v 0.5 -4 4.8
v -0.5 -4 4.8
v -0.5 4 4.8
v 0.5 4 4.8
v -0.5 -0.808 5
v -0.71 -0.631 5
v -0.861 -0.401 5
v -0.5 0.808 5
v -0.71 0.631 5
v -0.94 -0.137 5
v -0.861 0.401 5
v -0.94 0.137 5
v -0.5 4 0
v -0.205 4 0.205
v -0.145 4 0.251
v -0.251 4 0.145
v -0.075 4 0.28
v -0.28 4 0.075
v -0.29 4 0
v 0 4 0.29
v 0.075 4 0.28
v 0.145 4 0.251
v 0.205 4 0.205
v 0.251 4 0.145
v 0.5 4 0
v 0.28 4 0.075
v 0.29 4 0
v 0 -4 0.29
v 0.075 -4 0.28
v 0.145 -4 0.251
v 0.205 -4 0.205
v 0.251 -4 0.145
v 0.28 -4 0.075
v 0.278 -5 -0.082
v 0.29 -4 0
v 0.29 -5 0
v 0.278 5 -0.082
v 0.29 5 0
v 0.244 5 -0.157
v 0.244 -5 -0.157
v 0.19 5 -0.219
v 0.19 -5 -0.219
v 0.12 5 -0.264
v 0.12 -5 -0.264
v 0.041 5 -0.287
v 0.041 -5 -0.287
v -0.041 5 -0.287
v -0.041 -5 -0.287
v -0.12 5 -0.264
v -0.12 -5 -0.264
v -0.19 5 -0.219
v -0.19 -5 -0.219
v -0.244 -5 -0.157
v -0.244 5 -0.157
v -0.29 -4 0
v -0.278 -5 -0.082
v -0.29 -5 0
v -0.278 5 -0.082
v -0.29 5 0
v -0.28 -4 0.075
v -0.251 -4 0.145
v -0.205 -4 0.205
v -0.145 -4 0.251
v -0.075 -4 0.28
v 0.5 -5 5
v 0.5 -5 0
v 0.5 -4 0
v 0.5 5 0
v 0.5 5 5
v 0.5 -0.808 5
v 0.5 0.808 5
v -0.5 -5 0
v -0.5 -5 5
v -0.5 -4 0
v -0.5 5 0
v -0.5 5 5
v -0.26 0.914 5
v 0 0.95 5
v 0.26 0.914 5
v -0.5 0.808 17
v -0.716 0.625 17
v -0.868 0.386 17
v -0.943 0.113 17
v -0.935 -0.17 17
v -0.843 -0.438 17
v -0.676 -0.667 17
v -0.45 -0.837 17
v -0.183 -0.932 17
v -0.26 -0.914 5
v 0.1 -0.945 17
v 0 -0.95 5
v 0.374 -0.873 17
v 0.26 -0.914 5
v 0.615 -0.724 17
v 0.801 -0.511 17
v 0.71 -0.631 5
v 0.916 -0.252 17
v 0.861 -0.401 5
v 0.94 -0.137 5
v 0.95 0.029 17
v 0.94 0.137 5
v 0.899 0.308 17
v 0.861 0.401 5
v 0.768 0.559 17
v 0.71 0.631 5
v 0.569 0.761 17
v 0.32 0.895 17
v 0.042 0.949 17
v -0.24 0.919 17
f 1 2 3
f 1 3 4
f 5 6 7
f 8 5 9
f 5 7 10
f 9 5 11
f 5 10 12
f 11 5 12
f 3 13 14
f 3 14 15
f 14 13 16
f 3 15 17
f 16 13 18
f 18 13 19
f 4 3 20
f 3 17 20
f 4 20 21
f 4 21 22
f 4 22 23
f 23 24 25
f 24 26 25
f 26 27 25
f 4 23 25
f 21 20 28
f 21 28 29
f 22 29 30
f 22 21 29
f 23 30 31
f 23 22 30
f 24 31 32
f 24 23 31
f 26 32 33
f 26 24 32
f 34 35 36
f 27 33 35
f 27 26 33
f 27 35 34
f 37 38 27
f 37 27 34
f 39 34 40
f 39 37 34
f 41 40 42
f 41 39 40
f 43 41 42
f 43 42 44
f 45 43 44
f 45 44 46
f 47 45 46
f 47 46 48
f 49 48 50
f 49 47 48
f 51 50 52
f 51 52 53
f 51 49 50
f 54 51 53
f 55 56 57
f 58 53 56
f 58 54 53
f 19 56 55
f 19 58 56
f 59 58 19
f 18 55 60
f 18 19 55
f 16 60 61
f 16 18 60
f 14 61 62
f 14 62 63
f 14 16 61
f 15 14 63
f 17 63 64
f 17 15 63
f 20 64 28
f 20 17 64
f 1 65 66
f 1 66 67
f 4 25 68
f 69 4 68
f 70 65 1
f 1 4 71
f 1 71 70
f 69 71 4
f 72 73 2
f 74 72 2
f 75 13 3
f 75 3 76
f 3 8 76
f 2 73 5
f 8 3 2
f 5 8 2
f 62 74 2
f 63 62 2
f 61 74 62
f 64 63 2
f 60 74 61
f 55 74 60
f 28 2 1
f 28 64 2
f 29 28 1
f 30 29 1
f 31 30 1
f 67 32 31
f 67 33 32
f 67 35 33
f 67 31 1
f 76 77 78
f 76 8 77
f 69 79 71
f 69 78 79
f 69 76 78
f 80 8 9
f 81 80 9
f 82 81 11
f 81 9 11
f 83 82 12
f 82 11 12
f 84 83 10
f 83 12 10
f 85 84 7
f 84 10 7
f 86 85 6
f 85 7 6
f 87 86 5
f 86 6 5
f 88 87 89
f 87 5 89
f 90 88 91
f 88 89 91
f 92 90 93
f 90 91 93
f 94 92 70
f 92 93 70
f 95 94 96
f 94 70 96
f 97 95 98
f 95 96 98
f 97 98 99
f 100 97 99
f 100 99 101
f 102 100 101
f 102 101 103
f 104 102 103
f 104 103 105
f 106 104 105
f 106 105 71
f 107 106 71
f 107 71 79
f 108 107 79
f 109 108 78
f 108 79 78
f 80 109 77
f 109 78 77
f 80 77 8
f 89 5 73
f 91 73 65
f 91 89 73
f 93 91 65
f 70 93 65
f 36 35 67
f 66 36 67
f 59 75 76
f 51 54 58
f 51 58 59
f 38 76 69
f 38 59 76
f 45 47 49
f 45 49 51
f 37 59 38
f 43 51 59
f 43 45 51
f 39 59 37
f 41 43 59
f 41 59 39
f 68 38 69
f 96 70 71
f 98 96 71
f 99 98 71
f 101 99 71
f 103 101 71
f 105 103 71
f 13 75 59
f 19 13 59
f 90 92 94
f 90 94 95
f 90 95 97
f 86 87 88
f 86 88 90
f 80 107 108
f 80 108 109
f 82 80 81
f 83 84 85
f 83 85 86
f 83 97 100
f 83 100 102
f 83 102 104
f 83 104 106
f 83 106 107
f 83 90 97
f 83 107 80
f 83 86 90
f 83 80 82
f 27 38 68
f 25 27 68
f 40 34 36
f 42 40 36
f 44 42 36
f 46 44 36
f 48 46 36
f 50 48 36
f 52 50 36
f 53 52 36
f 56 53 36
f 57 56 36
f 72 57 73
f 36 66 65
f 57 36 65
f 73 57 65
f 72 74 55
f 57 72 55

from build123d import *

# Parameters (mm, degrees)
SKETCH_1_R      = 0.29
EXTRUDE_1_DEPTH = 5
SKETCH_2_W      = 1
SKETCH_2_H      = 1
EXTRUDE_2_DEPTH = 5
SKETCH_3_W      = 1
SKETCH_3_H      = 8
EXTRUDE_3_DEPTH = 0.2
SKETCH_4_R      = 0.95
EXTRUDE_4_DEPTH = 12


with BuildPart() as part:
    # 草图1 → 凸台-拉伸1 (new, symmetric)
    with BuildSketch(Plane(origin=(0, 0, 0), x_dir=(1, 0, 0), z_dir=(0, 1, 0))):
        with Locations(Location((0, 0, 0), (0, 0, 270))):
            Circle(SKETCH_1_R)
    extrude(amount=EXTRUDE_1_DEPTH, both=True)

    # 草图2 → 凸台-拉伸2 (add)
    with BuildSketch(Plane.XY):
        with Locations((0, 4.5)):
            Rectangle(SKETCH_2_W, SKETCH_2_H)
        with Locations((0, -4.5)):
            Rectangle(SKETCH_2_W, SKETCH_2_H)
    extrude(amount=EXTRUDE_2_DEPTH)

    # 草图3 → 凸台-拉伸3 (add)
    with BuildSketch(Plane.XY.offset(5)):
        Rectangle(SKETCH_3_W, SKETCH_3_H)
    extrude(amount=-EXTRUDE_3_DEPTH)

    # 草图4 → 凸台-拉伸4 (add)
    with BuildSketch(Plane.XY.offset(5)):
        with Locations(Location((0, 0, 0), (0, 0, 121.756863859))):
            Circle(SKETCH_4_R)
    extrude(amount=EXTRUDE_4_DEPTH)


solid = part.part
